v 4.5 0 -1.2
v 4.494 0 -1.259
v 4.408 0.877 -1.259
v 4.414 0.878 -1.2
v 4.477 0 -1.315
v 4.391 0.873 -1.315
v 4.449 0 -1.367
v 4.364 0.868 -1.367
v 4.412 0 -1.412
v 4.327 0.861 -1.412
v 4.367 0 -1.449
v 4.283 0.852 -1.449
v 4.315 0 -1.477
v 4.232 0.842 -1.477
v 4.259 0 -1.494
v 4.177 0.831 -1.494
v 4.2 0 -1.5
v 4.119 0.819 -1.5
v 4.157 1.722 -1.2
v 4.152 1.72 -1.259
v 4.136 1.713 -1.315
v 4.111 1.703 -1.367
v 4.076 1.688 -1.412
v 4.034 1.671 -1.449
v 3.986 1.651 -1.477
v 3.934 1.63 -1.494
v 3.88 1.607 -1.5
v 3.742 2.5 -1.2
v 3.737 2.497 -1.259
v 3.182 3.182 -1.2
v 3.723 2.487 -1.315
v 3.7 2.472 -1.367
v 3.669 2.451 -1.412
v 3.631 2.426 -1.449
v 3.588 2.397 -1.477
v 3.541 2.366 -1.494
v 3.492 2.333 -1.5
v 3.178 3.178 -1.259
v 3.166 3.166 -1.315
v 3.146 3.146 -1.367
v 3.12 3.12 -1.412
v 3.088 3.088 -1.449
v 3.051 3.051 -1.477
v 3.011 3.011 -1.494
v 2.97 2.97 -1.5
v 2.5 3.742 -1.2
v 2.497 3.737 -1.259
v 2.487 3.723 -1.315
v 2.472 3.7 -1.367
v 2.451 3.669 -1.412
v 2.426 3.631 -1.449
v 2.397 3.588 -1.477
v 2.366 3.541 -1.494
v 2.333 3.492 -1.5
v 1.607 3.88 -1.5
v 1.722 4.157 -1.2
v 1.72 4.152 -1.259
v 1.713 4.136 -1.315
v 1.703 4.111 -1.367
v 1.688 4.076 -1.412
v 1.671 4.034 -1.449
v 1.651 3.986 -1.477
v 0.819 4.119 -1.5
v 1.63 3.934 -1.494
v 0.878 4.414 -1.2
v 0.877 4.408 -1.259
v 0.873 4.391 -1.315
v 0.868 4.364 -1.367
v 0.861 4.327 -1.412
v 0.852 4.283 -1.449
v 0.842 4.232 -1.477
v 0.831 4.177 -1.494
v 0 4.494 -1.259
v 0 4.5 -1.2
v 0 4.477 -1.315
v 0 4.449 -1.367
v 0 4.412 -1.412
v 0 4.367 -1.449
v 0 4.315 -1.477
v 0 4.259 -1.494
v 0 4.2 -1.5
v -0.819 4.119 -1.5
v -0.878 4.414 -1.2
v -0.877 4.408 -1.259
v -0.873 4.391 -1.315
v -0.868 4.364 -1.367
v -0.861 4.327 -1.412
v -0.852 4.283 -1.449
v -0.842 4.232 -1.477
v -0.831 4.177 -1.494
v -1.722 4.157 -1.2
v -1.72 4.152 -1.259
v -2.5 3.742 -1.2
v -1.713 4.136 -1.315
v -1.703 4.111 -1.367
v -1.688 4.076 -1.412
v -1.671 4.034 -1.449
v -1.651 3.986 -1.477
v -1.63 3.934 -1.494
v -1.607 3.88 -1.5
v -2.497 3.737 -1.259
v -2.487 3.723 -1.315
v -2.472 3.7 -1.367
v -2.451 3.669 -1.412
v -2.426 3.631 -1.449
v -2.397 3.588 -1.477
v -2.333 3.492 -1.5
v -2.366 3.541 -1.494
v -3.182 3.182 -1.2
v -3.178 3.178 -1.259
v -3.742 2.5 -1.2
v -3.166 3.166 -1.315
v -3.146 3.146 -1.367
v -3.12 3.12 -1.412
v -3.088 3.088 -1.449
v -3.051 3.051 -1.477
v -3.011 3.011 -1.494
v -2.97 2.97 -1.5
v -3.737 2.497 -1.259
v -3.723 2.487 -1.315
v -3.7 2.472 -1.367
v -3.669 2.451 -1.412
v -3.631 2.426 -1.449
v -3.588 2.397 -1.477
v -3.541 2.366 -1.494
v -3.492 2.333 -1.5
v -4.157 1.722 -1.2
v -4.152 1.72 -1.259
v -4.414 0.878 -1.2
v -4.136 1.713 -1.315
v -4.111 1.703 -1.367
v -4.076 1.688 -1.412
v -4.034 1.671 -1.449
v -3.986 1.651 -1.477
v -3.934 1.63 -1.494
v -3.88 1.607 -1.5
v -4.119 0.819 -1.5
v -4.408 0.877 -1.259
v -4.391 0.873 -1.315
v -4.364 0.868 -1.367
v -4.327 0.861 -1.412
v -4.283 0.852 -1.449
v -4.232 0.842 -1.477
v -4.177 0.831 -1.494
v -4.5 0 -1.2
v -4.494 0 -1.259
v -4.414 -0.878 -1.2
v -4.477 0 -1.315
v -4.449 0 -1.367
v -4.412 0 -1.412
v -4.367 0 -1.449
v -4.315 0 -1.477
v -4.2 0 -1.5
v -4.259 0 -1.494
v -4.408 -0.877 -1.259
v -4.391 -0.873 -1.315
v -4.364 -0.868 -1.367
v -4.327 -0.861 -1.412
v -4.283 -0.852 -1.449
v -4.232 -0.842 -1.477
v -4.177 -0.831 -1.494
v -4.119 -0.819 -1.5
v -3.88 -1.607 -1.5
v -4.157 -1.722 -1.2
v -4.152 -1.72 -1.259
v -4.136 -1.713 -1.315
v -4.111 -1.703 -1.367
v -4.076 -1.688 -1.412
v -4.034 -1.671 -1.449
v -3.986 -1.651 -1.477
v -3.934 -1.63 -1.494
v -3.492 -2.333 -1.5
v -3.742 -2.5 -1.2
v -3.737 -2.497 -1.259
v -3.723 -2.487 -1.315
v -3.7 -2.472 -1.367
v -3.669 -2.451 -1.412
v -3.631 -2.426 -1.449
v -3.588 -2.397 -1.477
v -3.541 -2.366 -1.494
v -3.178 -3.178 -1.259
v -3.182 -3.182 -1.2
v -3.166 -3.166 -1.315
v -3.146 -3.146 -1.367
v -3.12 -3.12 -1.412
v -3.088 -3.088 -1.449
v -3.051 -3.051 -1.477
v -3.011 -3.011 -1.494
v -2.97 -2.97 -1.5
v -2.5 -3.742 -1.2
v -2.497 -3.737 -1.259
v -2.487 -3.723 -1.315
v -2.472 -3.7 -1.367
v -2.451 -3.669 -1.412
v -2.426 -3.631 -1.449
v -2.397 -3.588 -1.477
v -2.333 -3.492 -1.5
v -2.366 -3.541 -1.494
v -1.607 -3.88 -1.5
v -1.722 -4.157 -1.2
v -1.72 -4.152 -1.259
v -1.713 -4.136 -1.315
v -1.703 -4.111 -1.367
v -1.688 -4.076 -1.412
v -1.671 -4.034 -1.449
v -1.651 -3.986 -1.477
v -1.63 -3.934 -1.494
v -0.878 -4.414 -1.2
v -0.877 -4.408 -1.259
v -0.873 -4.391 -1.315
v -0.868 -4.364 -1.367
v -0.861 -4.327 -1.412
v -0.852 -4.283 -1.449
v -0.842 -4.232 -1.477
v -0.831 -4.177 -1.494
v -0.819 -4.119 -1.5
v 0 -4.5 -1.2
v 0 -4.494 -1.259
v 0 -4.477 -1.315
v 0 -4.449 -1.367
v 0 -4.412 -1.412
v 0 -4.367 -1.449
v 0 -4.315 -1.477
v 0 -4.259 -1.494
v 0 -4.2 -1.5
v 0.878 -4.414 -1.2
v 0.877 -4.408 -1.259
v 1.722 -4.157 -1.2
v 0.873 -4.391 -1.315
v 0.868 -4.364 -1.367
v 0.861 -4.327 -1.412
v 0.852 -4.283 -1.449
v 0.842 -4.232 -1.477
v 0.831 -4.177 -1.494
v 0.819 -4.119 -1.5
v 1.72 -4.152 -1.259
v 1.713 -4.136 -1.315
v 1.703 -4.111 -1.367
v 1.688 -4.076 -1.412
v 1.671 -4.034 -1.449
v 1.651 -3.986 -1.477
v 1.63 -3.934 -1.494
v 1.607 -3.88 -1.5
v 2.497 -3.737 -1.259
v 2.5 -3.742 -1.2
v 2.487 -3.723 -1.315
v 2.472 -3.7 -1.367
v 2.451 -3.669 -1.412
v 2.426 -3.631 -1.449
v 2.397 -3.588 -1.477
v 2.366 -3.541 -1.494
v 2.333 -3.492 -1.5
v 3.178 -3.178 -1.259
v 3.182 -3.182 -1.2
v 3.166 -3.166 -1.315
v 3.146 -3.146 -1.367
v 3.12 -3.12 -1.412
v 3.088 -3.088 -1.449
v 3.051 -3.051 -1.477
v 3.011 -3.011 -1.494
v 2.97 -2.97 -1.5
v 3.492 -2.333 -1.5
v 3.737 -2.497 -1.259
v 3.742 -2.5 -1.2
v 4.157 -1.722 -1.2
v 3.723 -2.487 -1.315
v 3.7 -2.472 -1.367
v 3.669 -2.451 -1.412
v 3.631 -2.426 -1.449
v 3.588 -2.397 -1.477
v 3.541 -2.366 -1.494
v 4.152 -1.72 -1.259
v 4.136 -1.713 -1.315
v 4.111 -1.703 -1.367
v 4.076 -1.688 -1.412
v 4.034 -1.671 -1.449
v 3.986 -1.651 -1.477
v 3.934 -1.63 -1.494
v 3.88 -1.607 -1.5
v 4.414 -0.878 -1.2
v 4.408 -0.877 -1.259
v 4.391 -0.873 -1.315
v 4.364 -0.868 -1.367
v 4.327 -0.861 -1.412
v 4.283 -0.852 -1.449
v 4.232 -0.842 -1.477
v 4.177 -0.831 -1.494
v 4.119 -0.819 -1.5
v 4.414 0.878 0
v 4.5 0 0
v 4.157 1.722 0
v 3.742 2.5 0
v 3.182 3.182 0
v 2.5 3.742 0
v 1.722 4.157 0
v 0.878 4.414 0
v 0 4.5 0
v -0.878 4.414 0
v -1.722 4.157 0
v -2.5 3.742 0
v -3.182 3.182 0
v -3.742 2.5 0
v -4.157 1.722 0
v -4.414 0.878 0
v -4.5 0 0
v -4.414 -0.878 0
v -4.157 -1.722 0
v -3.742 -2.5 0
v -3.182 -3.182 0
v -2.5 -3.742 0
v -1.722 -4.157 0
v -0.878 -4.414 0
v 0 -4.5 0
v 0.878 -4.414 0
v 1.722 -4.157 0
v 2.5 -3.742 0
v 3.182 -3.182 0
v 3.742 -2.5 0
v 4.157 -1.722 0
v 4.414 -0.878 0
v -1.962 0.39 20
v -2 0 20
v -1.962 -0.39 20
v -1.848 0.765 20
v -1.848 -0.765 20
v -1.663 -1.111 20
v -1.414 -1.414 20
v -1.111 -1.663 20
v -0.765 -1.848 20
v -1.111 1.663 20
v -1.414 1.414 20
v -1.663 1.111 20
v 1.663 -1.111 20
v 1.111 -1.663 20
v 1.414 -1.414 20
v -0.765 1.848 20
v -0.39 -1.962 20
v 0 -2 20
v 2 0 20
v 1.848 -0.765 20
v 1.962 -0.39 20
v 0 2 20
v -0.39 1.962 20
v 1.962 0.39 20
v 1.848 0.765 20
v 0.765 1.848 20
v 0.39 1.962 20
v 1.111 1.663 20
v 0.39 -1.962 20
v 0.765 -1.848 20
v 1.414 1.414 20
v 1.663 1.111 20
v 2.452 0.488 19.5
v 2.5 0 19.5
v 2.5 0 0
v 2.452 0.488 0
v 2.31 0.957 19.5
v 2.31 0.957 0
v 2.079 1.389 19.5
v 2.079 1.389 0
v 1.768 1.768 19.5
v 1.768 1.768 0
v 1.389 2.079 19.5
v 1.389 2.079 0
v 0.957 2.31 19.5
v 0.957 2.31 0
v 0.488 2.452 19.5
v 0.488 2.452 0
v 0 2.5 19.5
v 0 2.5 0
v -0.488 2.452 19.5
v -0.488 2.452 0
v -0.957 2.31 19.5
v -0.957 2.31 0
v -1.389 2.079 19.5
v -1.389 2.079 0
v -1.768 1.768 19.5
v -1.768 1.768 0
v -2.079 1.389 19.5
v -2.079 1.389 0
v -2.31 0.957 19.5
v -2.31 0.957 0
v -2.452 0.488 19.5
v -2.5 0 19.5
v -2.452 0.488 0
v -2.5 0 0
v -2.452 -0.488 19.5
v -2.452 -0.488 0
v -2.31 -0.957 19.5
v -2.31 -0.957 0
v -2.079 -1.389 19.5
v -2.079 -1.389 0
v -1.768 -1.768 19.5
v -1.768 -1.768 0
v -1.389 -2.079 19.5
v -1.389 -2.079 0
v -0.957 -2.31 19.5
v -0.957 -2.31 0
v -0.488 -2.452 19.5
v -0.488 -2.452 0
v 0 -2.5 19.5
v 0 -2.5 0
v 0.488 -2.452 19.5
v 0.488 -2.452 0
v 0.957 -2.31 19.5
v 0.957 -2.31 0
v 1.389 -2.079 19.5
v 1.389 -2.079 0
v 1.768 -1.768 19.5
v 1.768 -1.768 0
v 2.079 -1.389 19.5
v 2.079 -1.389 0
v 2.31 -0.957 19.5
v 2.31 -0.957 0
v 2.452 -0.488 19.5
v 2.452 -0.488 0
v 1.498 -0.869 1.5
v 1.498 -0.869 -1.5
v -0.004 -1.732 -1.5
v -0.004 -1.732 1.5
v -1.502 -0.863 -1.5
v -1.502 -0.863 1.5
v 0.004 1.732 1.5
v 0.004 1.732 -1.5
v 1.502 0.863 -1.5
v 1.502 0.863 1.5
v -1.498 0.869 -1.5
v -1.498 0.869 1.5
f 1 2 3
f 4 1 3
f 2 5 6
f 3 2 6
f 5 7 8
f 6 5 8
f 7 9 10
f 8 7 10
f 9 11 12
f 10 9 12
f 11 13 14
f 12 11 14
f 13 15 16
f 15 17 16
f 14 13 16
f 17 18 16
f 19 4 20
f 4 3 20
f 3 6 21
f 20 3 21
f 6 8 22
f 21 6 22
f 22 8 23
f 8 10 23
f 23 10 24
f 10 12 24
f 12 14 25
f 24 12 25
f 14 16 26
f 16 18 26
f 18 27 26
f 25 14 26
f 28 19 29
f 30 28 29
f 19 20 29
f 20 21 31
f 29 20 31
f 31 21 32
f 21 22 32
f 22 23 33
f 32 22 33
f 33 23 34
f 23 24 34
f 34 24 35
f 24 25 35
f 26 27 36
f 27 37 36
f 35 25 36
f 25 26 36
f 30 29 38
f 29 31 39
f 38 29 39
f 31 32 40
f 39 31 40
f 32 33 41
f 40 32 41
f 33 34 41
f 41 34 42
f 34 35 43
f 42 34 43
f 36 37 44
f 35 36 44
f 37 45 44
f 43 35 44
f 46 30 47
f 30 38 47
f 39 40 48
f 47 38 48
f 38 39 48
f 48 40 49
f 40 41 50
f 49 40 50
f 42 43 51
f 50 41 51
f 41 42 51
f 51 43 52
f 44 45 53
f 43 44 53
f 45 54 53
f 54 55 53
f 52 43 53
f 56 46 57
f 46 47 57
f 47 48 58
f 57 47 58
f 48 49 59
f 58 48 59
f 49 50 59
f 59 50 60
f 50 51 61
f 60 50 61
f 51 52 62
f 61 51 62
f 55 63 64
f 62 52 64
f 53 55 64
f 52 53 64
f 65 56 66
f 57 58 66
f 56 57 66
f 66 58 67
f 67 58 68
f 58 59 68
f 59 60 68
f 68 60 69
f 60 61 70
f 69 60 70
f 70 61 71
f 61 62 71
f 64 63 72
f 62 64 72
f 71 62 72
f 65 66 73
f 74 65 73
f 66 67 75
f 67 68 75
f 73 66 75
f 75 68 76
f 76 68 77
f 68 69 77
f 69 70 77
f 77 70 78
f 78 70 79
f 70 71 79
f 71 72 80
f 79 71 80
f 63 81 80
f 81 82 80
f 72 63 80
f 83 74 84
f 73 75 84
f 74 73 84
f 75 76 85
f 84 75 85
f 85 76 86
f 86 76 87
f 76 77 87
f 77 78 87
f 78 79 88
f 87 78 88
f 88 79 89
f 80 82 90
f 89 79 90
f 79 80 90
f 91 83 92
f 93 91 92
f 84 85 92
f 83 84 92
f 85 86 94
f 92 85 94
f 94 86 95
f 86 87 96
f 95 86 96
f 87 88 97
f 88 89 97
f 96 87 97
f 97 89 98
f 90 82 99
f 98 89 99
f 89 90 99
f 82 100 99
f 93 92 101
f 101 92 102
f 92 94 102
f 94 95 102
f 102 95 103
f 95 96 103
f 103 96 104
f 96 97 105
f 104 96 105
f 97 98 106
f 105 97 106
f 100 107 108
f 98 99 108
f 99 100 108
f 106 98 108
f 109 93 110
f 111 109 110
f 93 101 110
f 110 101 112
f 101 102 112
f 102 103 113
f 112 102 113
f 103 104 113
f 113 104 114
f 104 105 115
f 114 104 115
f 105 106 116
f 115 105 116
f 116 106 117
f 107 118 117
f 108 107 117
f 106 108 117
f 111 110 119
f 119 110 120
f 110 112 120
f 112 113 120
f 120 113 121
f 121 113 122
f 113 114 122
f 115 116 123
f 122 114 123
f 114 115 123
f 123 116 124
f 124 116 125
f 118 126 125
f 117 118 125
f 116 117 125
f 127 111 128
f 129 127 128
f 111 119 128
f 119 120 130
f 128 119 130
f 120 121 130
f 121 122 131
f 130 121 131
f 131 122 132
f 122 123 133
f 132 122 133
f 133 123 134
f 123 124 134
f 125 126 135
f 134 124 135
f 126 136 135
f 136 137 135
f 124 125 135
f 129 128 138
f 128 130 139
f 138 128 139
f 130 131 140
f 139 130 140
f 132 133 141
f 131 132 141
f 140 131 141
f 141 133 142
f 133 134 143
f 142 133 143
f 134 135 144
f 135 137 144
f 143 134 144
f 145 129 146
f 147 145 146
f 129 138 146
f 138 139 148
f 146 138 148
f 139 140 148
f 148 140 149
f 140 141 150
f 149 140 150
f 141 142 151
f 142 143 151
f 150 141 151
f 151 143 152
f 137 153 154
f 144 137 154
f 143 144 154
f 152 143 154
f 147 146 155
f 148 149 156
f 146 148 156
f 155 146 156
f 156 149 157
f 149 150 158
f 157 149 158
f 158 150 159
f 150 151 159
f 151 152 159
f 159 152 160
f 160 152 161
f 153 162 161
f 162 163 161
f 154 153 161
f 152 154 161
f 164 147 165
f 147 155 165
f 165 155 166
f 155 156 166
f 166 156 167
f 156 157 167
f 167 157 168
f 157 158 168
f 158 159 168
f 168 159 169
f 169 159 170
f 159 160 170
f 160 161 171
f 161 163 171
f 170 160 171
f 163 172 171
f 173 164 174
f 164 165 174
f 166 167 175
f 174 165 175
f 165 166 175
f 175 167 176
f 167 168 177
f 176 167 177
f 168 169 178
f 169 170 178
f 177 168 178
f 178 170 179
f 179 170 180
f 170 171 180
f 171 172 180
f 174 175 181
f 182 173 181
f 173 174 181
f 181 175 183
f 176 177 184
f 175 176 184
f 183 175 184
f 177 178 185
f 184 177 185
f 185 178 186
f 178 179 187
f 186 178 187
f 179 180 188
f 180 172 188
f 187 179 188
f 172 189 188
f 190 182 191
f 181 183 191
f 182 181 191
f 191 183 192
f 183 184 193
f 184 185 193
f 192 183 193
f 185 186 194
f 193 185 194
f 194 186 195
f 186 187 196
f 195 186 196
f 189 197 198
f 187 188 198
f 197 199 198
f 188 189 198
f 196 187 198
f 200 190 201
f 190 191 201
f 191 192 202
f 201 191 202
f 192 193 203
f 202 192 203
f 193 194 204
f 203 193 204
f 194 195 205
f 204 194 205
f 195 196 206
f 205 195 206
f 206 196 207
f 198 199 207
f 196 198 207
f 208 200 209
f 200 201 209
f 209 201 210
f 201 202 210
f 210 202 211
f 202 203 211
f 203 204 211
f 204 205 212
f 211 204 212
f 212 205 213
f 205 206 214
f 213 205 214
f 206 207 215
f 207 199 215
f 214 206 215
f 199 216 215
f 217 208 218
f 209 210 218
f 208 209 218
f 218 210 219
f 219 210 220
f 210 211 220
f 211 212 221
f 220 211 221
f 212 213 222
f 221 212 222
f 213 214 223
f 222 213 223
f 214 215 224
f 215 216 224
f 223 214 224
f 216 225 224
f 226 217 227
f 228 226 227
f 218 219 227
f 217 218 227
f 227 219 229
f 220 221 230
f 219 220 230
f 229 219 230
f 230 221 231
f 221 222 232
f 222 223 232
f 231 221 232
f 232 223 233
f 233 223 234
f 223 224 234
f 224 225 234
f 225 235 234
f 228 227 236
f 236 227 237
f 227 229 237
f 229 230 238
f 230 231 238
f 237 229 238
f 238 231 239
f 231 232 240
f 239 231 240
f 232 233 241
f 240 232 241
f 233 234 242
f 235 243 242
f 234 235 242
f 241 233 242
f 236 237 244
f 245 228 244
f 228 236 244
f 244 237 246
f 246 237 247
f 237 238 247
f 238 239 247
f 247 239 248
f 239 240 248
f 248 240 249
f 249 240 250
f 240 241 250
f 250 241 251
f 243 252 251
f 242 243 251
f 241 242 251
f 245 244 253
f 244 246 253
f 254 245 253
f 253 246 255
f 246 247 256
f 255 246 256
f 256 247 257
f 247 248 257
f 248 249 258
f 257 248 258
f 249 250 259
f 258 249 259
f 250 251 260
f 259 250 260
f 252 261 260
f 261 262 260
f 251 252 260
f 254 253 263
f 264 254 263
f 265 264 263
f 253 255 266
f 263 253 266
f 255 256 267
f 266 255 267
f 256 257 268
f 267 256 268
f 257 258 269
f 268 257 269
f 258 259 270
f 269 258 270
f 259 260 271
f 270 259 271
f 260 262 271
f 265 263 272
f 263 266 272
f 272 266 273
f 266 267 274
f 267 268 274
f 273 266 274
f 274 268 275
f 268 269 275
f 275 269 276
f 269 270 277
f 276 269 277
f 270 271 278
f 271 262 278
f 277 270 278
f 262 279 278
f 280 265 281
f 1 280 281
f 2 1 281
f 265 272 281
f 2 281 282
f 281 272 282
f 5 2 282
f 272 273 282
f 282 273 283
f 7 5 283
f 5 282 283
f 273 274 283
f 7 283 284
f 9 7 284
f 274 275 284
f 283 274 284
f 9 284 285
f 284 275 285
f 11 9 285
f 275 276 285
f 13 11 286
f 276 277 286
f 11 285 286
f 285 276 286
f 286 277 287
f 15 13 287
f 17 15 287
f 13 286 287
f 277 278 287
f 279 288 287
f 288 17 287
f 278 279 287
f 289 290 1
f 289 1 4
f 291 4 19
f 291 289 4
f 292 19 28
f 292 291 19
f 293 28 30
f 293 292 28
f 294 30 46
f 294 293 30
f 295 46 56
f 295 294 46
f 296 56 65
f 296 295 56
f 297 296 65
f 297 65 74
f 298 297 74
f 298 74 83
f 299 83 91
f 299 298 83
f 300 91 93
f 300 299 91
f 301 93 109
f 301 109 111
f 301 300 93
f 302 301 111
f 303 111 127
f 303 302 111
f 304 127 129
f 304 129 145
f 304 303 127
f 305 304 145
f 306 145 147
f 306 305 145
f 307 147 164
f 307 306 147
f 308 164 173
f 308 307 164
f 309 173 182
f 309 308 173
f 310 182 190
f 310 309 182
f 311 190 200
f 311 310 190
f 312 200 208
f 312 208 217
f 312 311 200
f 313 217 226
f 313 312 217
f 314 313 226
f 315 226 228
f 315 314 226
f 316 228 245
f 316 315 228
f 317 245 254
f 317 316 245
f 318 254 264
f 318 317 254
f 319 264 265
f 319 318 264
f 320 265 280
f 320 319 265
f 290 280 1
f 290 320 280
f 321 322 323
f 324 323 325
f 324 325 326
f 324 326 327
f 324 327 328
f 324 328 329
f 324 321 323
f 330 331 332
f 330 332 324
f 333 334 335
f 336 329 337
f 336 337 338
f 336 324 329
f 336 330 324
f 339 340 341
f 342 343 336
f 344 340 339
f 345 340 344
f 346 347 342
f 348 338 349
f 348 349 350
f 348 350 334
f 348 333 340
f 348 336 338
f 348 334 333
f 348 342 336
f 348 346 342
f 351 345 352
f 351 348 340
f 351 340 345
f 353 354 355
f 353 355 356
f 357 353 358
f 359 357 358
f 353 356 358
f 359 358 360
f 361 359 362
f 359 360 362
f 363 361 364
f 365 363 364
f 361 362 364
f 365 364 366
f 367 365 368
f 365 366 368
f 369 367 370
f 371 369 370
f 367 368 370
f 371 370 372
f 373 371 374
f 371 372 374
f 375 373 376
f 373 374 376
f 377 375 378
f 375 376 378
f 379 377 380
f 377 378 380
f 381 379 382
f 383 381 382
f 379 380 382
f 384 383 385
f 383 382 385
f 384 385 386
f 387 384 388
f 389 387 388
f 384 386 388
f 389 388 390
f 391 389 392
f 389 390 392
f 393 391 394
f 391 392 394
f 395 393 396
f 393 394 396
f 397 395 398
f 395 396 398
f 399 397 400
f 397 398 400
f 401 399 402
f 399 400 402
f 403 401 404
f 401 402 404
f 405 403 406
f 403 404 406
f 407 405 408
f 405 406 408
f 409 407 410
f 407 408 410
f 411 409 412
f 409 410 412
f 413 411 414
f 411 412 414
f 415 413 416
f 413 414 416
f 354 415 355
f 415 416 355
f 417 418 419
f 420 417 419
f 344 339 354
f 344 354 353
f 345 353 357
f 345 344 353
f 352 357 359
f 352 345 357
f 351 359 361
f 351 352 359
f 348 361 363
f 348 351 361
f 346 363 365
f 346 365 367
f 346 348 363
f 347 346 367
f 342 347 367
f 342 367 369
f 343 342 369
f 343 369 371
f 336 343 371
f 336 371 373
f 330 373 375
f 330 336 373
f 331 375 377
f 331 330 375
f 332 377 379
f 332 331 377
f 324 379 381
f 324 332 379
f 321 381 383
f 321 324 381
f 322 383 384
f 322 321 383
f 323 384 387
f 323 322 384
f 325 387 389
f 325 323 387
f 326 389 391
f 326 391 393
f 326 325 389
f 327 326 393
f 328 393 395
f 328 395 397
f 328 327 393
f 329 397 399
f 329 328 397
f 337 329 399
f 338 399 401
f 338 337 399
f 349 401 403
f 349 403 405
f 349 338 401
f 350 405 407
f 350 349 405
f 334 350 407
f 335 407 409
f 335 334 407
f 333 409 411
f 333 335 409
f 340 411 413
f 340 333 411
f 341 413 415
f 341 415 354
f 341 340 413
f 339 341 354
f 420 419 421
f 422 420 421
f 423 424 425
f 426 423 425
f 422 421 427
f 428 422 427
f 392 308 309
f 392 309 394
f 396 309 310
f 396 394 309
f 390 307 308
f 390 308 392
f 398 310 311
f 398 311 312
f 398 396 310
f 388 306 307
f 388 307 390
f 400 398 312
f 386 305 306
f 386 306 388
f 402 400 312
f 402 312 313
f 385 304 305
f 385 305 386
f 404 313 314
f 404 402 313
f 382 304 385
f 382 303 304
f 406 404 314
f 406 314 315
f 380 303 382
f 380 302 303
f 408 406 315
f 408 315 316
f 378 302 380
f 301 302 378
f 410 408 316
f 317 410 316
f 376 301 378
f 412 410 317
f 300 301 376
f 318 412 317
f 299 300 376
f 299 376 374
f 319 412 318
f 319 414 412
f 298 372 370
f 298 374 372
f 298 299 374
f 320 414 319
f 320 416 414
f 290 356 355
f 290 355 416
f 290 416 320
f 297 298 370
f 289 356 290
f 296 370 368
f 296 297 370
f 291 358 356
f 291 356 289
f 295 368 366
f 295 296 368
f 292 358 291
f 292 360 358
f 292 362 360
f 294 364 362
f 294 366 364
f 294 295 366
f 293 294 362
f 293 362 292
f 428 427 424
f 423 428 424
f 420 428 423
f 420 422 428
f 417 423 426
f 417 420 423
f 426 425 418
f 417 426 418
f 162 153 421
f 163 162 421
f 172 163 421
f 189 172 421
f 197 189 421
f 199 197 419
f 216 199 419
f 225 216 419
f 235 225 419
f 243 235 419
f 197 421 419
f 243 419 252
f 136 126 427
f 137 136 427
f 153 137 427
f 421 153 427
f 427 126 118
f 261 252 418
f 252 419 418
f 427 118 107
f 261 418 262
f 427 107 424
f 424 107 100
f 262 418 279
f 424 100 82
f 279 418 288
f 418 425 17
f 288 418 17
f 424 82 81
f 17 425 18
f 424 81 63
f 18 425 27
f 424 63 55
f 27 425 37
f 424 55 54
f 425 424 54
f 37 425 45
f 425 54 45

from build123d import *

# Parameters (mm, degrees)
F0_R      = 2.5
F1_DEPTH  = 20
F0_R_2    = 4.5
F1_FACE_R = 2.5
F2_DEPTH  = 1.5
F4_R      = 0.3
F5_DEPTH  = 3
F6_SIZE   = 0.5


with BuildPart() as f1:
    # F0 (on Top) → F1 (new body)
    with BuildSketch(Plane.XY):
        Circle(F0_R)
    extrude(amount=F1_DEPTH)

    # F0 (on Top) + F1_face (on face) → F2 (join)
    with BuildSketch(Plane.XY):
        Circle(F0_R_2)
        Circle(F0_R, mode=Mode.SUBTRACT)
    with BuildSketch(Plane(origin=(0, 0, 0), x_dir=(1, 0, 0), z_dir=(0, 0, -1))):
        Circle(F1_FACE_R)
    extrude(amount=-F2_DEPTH, dir=(0, 0, 1))

    # F4
    f4_edges = [f1.edges().sort_by_distance(p)[0] for p in [
        (-4.5, 0, -1.5),
    ]]
    fillet(f4_edges, radius=F4_R)

    # F3 (on face) → F5 (cut)
    with BuildSketch(Plane(origin=(0, 0, -1.5), x_dir=(1, 0, 0), z_dir=(0, 0, -1))):
        Polygon((-1.4980509352, -0.869392544), (0.0038905614, -1.732046438), (1.5019414966, -0.862653894), (1.4980509352, 0.869392544), (-0.0038905614, 1.732046438), (-1.5019414966, 0.862653894), align=None)
    extrude(amount=-F5_DEPTH, mode=Mode.SUBTRACT)

    # F6
    f6_edges = [f1.edges().sort_by_distance(p)[0] for p in [
        (-2.5, 0, 20),
    ]]
    chamfer(f6_edges, length=F6_SIZE)


solid = f1.part
